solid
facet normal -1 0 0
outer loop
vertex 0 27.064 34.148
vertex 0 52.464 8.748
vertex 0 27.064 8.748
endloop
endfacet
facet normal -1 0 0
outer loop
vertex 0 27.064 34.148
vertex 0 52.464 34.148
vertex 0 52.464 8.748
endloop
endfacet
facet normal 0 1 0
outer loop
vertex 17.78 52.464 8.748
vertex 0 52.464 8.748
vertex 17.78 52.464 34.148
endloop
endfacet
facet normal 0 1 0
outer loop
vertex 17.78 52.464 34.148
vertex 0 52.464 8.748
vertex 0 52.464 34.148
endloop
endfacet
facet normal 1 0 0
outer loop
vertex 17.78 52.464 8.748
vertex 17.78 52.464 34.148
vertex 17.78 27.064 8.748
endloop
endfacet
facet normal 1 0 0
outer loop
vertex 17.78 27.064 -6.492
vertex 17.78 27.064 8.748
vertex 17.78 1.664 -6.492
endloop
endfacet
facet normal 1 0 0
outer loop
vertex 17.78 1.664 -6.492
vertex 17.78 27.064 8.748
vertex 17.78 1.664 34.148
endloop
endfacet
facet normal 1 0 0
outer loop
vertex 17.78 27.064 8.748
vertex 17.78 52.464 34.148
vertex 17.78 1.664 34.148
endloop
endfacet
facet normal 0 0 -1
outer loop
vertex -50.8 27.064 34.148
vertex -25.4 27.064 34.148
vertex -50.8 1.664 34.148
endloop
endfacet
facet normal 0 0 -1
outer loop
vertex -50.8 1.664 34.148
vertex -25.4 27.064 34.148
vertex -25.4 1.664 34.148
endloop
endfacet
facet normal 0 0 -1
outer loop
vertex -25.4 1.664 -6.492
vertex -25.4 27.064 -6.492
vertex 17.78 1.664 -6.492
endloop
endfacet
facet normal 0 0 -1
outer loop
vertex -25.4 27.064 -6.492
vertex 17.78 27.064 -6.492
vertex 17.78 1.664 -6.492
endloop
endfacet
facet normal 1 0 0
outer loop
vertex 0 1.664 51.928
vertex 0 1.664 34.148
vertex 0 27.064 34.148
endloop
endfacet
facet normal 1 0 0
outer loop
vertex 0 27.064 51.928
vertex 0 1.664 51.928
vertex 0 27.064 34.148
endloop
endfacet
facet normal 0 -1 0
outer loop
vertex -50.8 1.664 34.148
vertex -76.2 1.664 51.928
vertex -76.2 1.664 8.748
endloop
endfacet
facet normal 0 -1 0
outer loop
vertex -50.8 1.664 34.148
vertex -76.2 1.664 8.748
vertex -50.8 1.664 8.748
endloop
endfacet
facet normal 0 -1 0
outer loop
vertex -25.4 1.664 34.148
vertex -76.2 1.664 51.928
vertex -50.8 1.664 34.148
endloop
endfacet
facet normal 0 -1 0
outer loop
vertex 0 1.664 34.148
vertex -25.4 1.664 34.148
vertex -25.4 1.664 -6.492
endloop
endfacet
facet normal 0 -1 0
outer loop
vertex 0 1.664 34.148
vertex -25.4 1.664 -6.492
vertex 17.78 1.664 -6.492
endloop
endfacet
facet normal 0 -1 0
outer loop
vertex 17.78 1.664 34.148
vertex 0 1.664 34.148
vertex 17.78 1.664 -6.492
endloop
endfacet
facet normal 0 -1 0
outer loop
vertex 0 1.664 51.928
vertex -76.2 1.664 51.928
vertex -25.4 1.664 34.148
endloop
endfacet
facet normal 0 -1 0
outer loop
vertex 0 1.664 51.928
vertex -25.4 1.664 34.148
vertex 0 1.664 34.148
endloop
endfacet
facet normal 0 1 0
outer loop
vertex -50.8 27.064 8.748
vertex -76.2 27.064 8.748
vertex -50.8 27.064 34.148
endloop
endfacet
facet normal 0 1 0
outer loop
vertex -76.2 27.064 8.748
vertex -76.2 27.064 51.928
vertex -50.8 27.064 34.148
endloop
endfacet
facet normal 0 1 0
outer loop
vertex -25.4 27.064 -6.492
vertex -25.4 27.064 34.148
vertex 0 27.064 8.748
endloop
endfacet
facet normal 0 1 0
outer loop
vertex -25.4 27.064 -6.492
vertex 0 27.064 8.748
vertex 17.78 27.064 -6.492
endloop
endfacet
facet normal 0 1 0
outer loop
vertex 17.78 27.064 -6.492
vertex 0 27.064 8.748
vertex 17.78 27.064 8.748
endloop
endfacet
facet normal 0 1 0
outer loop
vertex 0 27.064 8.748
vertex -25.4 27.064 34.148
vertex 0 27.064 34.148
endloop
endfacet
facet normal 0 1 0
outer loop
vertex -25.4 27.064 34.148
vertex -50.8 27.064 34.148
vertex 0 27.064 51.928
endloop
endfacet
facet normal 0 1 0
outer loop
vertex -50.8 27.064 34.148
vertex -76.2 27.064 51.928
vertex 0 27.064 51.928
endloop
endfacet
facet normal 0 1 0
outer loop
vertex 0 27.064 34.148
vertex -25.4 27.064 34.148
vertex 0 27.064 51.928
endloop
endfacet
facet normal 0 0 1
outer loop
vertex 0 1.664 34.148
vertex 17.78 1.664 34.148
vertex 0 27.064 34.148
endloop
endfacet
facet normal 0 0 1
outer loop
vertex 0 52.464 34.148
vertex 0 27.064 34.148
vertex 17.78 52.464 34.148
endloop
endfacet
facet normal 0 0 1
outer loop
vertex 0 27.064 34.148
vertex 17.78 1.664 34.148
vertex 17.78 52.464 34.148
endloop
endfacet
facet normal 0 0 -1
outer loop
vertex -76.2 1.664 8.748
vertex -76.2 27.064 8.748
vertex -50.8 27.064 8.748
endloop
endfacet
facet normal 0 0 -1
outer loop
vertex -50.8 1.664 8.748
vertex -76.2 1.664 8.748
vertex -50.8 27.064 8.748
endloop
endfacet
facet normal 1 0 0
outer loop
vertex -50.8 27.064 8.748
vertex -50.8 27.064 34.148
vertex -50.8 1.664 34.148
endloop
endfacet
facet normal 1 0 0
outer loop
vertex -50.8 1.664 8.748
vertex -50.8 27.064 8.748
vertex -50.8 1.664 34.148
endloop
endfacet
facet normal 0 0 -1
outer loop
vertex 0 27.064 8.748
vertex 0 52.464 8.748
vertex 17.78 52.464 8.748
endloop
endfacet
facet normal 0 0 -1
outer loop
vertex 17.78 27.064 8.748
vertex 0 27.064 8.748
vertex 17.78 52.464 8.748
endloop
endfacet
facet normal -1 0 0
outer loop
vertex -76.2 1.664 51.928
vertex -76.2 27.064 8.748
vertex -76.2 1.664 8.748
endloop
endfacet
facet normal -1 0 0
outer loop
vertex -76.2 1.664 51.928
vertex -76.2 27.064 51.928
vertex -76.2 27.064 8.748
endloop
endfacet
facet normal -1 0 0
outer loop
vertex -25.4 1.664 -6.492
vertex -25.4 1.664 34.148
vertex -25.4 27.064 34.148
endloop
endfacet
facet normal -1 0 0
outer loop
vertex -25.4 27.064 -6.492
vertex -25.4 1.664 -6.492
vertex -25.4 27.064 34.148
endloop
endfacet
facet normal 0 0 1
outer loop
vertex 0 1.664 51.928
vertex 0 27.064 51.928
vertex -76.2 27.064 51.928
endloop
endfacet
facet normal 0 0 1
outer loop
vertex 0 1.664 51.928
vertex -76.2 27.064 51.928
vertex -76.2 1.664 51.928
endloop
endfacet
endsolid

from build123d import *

# Parameters (mm, degrees)
F0_W      = 25.4
F0_H      = 25.3999925918
F1_DEPTH  = 17.78
F2_DEPTH  = 25.4
F3_W      = 17.78
F3_H      = 25.4
F4_DEPTH  = 15.24
F6_DEPTH  = 25.4
F7_W      = 25.4
F7_H      = 25.4
F8_DEPTH  = 17.78
F9_W      = 25.4
F9_H      = 17.78
F10_DEPTH = 50.8
F11_W     = 25.4
F11_H     = 25.4
F12_DEPTH = 25.4


with BuildPart() as f1:
    # F0 (on Right) → F1 (new body)
    with BuildSketch(Plane.YZ):
        with Locations((39.7640056908, 21.4484632015)):
            Rectangle(F0_W, F0_H)
    extrude(amount=F1_DEPTH)

    # F2 (add): a face of the model
    f2_faces = [f1.faces().sort_by_distance(p)[0] for p in [
        (8.89, 27.0640056908, 21.4484632015),
    ]]
    extrude(f2_faces, amount=F2_DEPTH)

    # F3 (on face) → F4 (join)
    with BuildSketch(Plane(origin=(0, 0, 8.7484669056), x_dir=(1, 0, 0), z_dir=(0, 0, -1))):
        with Locations((8.89, -14.3640056908)):
            Rectangle(F3_W, F3_H)
    extrude(amount=F4_DEPTH)

    # F5 (on face) → F6 (join)
    with BuildSketch(Plane(origin=(0, 0, 0), x_dir=(0, -1, 0), z_dir=(-1, 0, 0))):
        Polygon((-27.0640056908, 34.1484594974), (-27.0640056908, 8.7484669056), (-27.0640056908, -6.4915330944), (-1.6640056908, -6.4915330944), (-1.6640056908, 34.1484594974), align=None)
    extrude(amount=F6_DEPTH)

    # F7 (on face) → F8 (join)
    with BuildSketch(Plane.XY.offset(34.1484594974)):
        with Locations((-12.7, 14.3640056908)):
            Rectangle(F7_W, F7_H)
    extrude(amount=F8_DEPTH)

    # F9 (on face) → F10 (join)
    with BuildSketch(Plane(origin=(-25.4, 0, 0), x_dir=(0, -1, 0), z_dir=(-1, 0, 0))):
        with Locations((-14.3640056908, 43.0384594974)):
            Rectangle(F9_W, F9_H)
    extrude(amount=F10_DEPTH)

    # F11 (on face) → F12 (join)
    with BuildSketch(Plane(origin=(0, 0, 34.1484594974), x_dir=(1, 0, 0), z_dir=(0, 0, -1))):
        with Locations((-63.5, -14.3640056908)):
            Rectangle(F11_W, F11_H)
    extrude(amount=F12_DEPTH)


solid = f1.part
